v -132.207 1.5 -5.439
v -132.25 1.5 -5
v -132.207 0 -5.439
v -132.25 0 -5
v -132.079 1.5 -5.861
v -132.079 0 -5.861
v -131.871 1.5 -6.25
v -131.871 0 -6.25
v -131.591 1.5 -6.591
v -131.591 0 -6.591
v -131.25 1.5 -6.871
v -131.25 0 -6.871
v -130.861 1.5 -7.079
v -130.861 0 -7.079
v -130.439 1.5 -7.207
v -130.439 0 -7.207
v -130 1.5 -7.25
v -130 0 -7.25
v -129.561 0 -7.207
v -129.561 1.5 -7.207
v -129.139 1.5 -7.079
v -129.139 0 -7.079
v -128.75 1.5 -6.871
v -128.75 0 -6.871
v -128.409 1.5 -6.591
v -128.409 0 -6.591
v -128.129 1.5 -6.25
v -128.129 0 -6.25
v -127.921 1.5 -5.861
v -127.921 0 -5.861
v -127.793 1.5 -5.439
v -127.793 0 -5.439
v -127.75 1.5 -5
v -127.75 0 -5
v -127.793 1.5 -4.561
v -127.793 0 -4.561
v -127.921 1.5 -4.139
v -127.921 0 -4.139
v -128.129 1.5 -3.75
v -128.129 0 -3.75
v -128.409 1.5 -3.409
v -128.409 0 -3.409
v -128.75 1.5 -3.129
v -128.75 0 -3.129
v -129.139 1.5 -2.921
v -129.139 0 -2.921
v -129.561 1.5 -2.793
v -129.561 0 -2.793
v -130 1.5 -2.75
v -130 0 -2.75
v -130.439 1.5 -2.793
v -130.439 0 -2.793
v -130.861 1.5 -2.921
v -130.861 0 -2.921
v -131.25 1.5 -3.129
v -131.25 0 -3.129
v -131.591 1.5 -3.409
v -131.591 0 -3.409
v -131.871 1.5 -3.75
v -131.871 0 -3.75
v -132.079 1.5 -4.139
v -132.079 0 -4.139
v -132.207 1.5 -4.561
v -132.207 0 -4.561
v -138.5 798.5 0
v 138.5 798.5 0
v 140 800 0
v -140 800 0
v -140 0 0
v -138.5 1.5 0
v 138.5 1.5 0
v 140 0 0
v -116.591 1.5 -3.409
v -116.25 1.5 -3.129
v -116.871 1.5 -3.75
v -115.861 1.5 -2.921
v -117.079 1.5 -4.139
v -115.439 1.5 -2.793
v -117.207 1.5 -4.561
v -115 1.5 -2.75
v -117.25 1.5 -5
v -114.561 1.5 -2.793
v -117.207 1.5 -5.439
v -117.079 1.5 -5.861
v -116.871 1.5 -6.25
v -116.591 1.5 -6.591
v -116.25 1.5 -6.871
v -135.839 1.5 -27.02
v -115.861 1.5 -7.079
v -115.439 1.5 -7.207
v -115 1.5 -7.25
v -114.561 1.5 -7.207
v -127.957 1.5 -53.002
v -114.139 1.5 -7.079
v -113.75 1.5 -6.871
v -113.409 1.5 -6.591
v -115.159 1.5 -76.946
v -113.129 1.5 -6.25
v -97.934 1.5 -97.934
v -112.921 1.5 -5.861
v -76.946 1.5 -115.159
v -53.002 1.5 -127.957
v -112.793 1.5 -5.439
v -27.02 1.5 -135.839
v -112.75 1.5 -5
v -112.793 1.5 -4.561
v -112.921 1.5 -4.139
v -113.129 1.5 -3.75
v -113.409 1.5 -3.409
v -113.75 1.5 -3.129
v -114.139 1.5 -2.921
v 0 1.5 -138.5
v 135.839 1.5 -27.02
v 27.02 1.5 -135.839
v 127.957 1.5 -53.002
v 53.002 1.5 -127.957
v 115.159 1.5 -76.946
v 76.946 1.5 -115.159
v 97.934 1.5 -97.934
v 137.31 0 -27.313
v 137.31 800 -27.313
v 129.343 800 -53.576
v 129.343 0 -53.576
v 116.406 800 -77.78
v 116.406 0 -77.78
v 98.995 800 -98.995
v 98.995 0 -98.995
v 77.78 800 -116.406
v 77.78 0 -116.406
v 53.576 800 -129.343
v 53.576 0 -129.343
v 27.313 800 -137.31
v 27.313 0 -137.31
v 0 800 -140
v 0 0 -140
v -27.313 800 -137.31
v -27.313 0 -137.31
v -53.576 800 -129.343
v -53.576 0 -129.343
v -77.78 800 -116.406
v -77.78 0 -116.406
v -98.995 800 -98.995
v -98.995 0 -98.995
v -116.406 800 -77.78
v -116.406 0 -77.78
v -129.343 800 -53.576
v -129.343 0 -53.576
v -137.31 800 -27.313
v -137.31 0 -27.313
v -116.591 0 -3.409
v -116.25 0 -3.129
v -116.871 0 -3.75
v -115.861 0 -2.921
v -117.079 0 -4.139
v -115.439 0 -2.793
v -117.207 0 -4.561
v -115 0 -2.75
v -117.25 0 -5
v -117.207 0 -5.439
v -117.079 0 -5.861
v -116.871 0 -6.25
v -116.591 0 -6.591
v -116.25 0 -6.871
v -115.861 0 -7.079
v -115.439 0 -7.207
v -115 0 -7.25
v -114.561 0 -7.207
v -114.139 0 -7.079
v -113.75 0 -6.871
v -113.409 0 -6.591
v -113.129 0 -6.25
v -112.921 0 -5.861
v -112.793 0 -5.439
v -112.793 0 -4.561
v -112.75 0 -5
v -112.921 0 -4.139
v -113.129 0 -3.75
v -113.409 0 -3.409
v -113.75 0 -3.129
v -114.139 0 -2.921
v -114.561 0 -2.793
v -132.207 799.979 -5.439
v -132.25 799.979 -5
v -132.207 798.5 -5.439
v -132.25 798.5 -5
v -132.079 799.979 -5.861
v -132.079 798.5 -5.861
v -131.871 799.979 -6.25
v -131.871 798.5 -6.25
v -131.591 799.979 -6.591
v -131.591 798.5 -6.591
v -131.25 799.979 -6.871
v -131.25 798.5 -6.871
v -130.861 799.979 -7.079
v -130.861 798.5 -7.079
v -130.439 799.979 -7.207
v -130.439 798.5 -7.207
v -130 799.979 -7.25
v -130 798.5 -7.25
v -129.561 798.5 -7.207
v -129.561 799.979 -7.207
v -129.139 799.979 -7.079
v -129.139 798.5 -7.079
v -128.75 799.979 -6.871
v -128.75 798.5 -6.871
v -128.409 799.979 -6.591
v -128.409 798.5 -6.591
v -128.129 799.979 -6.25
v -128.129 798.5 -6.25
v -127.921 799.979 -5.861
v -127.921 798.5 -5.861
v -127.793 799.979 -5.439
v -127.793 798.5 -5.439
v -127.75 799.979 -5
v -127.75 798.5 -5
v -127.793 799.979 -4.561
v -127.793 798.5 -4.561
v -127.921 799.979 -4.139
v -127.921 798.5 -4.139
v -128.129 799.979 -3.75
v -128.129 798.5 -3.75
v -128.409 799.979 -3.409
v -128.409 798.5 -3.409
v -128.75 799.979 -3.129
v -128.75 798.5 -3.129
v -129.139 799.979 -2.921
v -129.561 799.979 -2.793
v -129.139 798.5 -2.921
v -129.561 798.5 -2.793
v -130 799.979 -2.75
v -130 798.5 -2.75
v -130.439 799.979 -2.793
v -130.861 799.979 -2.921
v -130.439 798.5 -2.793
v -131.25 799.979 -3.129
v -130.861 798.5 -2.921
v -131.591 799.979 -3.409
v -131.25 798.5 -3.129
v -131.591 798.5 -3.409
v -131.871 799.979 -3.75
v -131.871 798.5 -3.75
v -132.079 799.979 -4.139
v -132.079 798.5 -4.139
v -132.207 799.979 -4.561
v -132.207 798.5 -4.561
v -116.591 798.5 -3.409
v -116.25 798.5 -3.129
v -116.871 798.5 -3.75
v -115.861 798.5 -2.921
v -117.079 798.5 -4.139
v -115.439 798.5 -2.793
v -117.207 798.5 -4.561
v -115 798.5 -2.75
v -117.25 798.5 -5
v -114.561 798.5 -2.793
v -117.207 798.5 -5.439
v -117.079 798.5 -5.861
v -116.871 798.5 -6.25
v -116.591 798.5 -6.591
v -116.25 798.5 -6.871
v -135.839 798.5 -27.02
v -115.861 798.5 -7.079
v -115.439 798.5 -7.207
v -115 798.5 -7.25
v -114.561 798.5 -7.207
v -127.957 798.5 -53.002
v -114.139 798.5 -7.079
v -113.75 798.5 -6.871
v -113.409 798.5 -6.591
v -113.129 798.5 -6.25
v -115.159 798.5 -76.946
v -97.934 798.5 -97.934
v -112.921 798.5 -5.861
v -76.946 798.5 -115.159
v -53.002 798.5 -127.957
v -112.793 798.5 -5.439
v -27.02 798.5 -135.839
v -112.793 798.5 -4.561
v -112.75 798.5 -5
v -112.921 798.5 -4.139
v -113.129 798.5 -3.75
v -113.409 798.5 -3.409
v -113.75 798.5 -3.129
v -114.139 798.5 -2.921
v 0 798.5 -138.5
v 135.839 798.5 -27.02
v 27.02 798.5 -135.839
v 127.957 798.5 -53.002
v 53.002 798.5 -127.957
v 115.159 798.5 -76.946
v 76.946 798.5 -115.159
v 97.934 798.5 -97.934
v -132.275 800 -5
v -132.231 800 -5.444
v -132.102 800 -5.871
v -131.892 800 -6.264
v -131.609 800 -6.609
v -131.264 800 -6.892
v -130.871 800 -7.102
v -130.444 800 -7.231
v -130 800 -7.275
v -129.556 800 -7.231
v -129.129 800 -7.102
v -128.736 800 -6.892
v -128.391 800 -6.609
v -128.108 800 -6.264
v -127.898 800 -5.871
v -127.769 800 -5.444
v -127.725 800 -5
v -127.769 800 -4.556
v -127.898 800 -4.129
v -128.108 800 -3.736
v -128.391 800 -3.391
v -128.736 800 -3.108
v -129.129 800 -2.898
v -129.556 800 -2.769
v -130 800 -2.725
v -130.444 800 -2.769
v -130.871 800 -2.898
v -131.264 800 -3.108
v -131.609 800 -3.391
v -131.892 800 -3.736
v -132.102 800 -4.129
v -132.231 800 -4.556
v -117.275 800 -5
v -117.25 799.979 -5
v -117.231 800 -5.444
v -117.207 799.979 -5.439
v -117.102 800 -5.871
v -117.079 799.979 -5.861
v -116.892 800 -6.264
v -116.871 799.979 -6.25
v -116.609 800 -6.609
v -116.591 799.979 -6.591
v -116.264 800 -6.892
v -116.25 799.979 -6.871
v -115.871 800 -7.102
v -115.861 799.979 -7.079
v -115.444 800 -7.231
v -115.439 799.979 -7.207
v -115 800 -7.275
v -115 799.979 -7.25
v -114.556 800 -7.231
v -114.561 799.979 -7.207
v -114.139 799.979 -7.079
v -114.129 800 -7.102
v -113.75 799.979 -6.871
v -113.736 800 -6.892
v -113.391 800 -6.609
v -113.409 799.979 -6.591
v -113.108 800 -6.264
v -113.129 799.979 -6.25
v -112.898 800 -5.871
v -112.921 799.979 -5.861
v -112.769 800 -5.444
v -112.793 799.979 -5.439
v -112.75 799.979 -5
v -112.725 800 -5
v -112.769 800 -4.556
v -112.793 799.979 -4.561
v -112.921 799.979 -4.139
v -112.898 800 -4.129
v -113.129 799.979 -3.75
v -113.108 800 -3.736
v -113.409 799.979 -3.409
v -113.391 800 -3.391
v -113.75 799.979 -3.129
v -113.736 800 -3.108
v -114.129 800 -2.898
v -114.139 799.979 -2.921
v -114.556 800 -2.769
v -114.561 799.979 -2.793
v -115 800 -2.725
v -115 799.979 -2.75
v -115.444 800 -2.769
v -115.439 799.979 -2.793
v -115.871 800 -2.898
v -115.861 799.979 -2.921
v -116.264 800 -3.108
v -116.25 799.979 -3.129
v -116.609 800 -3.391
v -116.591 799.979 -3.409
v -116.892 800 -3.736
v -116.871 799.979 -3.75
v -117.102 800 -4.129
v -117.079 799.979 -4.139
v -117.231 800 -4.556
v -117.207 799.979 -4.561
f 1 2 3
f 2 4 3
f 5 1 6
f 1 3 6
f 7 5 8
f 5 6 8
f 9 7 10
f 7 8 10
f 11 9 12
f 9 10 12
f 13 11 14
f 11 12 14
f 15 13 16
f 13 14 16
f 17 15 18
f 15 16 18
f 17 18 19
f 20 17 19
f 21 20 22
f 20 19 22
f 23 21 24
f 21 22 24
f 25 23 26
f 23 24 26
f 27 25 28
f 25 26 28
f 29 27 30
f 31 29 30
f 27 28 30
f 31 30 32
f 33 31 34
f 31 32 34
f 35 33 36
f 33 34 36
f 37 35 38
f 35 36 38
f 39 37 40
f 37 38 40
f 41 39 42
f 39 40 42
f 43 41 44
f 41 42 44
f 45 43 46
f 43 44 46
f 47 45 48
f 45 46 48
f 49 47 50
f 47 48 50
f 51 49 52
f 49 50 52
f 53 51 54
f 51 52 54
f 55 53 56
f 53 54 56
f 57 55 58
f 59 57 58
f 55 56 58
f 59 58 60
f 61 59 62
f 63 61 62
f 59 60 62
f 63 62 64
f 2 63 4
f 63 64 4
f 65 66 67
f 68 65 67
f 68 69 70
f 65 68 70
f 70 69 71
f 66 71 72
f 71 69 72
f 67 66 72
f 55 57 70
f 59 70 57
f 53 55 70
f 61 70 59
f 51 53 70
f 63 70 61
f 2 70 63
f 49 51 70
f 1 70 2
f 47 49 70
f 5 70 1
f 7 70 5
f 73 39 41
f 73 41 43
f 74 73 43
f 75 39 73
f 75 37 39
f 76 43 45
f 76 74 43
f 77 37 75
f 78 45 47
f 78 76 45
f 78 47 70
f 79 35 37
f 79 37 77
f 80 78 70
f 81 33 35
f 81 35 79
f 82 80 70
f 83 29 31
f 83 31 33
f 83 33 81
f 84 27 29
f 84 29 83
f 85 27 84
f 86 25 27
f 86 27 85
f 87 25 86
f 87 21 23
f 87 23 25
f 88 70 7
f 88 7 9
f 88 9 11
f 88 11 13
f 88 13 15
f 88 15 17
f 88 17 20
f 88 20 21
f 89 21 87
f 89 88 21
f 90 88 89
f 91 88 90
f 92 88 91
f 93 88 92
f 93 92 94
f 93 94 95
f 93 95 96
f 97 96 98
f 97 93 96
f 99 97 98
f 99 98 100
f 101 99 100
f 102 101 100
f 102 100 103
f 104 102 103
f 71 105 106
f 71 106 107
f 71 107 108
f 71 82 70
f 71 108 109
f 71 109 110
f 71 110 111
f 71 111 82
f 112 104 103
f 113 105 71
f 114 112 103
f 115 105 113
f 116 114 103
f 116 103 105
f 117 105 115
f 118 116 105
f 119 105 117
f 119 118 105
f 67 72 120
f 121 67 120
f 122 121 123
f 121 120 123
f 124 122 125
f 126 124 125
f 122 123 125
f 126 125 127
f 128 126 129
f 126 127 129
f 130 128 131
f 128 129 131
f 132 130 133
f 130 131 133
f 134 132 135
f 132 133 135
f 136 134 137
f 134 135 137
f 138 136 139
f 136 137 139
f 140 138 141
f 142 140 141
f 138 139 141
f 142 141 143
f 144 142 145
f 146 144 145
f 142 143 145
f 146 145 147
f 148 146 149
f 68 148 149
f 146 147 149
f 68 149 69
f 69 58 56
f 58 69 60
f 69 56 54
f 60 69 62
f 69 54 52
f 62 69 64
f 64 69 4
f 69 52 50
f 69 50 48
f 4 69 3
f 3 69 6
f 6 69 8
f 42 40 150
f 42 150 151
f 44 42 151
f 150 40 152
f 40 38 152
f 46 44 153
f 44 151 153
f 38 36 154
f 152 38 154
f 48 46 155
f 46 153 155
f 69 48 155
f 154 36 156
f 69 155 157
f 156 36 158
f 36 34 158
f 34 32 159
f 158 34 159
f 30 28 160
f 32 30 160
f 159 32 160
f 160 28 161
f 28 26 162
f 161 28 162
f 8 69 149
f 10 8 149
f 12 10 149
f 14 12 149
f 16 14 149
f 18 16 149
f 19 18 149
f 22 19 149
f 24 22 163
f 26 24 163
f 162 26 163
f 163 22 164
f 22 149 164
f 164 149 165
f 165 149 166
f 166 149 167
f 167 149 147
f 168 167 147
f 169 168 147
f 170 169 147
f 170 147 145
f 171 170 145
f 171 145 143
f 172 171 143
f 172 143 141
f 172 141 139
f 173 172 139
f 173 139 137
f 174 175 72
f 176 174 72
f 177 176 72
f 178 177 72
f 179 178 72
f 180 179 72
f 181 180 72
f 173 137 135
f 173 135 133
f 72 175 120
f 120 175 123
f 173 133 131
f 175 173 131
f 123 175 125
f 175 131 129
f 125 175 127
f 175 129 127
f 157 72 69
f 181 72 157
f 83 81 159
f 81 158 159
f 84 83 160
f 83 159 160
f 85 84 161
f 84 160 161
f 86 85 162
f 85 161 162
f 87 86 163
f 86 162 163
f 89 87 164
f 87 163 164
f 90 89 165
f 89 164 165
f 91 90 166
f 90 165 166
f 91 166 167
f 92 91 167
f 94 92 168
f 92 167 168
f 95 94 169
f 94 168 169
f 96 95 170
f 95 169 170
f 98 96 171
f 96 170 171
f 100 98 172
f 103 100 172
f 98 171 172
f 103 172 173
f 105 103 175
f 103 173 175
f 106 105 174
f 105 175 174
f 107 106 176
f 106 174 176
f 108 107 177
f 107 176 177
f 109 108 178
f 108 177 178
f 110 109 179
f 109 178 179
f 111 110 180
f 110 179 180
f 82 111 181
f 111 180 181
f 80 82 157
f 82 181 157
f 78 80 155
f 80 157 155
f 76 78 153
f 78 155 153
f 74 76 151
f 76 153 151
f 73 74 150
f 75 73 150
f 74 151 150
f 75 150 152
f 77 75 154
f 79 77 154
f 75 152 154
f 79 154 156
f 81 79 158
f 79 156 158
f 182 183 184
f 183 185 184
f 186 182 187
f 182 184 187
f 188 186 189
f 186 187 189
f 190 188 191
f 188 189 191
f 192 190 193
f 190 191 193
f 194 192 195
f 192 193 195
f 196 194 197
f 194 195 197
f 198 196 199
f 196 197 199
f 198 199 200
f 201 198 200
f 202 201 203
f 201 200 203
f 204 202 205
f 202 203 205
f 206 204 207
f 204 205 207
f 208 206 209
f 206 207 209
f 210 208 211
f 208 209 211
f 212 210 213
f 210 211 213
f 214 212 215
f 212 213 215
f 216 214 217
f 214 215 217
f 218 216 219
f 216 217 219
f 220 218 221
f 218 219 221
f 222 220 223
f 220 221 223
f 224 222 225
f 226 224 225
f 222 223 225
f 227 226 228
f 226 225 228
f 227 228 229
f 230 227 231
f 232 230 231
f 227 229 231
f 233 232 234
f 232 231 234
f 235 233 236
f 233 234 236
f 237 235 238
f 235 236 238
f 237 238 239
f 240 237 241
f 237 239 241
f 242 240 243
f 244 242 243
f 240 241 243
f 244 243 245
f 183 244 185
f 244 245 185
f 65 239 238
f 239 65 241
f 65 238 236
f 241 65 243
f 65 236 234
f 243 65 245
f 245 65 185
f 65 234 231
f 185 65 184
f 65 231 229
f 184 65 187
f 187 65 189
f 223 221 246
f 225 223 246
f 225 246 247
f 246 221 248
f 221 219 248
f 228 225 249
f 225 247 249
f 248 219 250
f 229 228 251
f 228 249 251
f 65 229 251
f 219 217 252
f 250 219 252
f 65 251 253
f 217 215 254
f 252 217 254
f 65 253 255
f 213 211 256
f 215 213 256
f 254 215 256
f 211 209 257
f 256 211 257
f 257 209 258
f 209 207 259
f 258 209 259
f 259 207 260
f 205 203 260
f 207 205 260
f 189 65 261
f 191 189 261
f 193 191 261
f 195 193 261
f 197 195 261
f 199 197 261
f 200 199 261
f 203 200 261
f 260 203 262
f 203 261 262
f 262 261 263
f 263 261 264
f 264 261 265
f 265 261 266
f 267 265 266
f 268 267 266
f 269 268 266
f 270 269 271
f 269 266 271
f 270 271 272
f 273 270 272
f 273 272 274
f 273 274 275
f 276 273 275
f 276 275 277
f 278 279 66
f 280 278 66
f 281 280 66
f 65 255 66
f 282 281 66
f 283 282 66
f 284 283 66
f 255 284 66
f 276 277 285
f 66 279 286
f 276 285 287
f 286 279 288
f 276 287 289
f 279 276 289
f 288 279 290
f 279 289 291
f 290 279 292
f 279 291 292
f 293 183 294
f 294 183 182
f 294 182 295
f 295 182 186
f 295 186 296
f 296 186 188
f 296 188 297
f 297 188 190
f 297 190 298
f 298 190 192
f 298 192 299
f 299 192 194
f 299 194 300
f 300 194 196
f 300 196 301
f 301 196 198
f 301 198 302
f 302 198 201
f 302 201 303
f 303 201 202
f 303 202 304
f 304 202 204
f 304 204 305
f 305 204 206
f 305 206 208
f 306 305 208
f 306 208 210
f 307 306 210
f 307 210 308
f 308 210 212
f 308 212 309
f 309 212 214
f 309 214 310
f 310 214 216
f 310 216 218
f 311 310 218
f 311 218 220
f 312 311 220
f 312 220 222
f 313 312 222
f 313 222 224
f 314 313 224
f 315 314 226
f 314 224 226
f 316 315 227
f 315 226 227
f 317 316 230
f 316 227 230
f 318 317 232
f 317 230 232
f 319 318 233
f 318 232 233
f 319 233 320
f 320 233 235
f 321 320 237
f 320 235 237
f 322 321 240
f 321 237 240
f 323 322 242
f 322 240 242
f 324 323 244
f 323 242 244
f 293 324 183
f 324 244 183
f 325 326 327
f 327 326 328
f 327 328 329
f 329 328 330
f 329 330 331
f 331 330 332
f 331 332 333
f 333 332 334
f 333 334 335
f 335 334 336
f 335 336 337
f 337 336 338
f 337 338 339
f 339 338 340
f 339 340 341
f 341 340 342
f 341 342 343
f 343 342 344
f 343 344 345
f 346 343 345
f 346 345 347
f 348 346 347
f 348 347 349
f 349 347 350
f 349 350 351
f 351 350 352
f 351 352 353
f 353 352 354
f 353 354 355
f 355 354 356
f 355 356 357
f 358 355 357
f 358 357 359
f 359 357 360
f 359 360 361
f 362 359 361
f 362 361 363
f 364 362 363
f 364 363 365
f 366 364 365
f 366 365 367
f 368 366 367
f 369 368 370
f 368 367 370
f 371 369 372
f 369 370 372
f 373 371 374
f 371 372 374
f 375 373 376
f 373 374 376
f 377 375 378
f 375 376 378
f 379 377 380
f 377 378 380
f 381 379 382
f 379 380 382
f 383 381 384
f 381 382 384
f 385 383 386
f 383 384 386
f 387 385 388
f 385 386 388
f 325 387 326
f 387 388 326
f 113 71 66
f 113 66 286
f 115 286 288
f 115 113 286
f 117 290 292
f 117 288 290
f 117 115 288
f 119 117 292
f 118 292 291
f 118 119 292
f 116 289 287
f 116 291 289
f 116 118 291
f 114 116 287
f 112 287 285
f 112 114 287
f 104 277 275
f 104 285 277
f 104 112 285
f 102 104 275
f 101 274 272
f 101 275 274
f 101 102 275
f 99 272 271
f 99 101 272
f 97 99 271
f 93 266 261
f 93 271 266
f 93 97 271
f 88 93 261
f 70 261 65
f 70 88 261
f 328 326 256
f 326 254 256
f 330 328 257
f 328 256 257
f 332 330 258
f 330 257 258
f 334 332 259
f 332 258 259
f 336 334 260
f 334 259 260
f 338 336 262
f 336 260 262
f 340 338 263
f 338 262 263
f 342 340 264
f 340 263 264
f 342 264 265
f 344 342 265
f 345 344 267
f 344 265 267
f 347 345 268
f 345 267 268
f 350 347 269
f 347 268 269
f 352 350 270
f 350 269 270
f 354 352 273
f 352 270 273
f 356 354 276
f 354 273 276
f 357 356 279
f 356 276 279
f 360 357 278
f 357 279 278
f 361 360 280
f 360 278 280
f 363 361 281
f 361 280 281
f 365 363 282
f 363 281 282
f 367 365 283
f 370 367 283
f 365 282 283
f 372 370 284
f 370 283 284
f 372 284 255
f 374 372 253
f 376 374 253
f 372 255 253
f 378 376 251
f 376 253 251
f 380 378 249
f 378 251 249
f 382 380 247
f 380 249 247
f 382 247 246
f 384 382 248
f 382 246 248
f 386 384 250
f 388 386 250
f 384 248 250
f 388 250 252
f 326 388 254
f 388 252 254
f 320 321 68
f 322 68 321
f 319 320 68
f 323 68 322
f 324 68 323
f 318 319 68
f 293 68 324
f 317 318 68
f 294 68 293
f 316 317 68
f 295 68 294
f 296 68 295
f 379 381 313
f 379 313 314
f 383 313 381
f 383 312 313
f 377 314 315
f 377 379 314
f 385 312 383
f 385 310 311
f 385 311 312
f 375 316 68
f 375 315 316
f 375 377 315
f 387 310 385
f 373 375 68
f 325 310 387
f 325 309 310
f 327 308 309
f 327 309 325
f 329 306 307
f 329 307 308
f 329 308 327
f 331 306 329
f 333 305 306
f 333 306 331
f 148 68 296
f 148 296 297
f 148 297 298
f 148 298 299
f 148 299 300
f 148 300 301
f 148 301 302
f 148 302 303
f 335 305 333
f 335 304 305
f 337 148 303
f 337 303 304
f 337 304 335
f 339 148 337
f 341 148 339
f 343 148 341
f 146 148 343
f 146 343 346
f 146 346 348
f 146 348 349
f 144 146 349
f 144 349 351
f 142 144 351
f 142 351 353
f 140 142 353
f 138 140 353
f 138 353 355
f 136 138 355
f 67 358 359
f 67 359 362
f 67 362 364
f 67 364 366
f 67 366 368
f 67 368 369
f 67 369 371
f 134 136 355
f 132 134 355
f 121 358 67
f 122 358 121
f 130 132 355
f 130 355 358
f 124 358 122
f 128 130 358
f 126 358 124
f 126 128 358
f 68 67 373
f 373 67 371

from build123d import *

# Parameters (mm, degrees)
BOSS_EXTRUDE1_DEPTH            = 800
SHELL1_T                       = -1.5
M4_CLEARANCE_HOLE1_D           = 4.5
M4_CLEARANCE_HOLE1_CSINK_D     = 4.55
M4_CLEARANCE_HOLE1_CSINK_ANGLE = 100


with BuildPart() as part:
    # Sketch1 → Boss-Extrude1 (new body)
    with BuildSketch(Plane(origin=(0, 0, 0), x_dir=(1, 0, 0), z_dir=(0, 1, 0))):
        with BuildLine():
            Line((-140, 0), (140, 0))
            ThreePointArc((140, 0), (0, 140), (-140, 0))
        make_face()
    extrude(amount=BOSS_EXTRUDE1_DEPTH)

    # Shell1
    shell1_openings = [part.faces().sort_by_distance(p)[0] for p in [
        (0, 400, 0),
    ]]
    offset(amount=SHELL1_T, openings=shell1_openings)

    # M4 Clearance Hole1 (through all)
    with Locations(Plane(origin=(0, 800, 0), x_dir=(1, 0, 0), z_dir=(0, 1, 0))):
        with Locations((-130, 5), (-115, 5)):
            CounterSinkHole(M4_CLEARANCE_HOLE1_D / 2, M4_CLEARANCE_HOLE1_CSINK_D / 2, counter_sink_angle=M4_CLEARANCE_HOLE1_CSINK_ANGLE)


solid = part.part
